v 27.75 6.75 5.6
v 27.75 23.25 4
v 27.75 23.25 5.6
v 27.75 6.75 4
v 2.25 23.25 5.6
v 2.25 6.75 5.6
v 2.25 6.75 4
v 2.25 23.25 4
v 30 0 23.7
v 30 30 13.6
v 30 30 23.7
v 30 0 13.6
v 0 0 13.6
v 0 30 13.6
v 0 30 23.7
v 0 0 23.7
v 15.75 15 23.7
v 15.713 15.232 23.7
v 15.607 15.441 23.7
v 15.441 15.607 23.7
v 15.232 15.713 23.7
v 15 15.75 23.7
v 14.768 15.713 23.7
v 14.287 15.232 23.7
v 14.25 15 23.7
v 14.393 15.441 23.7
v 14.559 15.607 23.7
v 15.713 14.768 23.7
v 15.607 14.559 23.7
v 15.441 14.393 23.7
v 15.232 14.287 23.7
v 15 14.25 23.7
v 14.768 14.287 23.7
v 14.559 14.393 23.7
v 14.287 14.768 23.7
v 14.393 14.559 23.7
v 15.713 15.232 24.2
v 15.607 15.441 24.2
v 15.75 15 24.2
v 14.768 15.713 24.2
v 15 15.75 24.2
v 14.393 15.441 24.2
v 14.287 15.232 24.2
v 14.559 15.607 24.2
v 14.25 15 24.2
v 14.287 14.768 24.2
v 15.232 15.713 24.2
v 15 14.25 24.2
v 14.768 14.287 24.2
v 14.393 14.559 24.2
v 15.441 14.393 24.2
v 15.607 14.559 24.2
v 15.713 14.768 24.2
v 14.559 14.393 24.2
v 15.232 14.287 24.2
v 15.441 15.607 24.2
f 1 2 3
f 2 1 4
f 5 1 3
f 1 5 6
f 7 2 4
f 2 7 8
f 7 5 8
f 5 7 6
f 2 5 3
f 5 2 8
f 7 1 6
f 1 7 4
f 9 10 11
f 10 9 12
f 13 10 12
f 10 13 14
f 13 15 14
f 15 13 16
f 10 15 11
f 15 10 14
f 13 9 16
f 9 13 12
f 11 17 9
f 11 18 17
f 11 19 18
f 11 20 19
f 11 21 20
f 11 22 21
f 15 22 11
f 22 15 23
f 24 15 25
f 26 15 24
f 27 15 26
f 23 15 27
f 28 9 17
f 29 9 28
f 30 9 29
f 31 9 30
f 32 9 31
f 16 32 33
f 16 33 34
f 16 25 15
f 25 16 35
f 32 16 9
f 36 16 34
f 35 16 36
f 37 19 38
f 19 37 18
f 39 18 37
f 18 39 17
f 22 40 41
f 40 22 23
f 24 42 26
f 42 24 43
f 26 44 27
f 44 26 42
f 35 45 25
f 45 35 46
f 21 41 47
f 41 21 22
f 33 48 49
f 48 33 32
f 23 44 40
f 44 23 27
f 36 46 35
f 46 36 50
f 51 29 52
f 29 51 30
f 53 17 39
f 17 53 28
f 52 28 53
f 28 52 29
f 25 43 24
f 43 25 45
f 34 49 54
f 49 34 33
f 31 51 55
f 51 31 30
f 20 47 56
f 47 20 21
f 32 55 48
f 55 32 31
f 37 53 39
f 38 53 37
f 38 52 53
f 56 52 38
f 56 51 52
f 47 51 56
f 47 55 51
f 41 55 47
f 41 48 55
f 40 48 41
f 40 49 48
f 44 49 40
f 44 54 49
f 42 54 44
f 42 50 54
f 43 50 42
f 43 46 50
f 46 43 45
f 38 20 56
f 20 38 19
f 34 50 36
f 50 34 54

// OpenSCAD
// stack_assembly.scad
// Top-level visual assembly. Imports each part and renders the
// stack for sanity-checking dimensions and clearances.
//
// NOT for export. Use individual part files for STL/DXF generation.
//
// Render: F5 with $fn=20 for fast preview; F6 with $fn=60 for accurate.

$fn = 30;

// =================================================================
// TIER (must match across all imported scads)
// =================================================================
TIER_PARAM = "single-cell";    // Change for full assembly preview

// =================================================================
// LAYER THICKNESSES (from 05_FULL_ARRAY_BUILD.md §6)
// =================================================================
DRIVER_FLOOR_GAP      = 4.0;     // standoffs from enclosure floor to driver PCB
DRIVER_PCB_THK        = 1.6;
DRIVER_TO_COIL_GAP    = 8.0;     // standoffs from driver PCB to coil PCB
PCB_THICKNESS         = 1.6;     // coil PCB
FERRITE_THICKNESS     = 0.5;
LOWER_POLE_THICKNESS  = 0.5;
HOUSING_THICKNESS     = 4.0;
UPPER_POLE_THICKNESS  = 0.5;
TOP_PLATE_THICKNESS   = 3.0;
PIN_PROTRUSION        = 0.5;

// Plate sizing per tier
function plate_xy(t) =
    t == "single-cell" ? [30, 30]
    : t == "forty-cell" ? [280, 35]
    : t == "full-array" ? [180, 190]
    : [0, 0];

PXY = plate_xy(TIER_PARAM);

// =================================================================
// LAYER COLORS
// =================================================================
COL_PCB     = [0.10, 0.10, 0.10, 1.0];   // black solder mask
COL_COIL    = [0.85, 0.55, 0.20, 1.0];   // copper, accent
COL_FERRITE = [0.40, 0.40, 0.45, 0.7];   // gray, semi-transparent
COL_POLE    = [0.50, 0.50, 0.55, 1.0];   // steel
COL_HOUSING = [0.20, 0.20, 0.25, 1.0];   // CF-PETG (dark gray)
COL_AL      = [0.85, 0.85, 0.90, 1.0];   // anodized aluminum
COL_PIN     = [0.80, 0.80, 0.85, 1.0];

// =================================================================
// STACK
// =================================================================

z_driver     = DRIVER_FLOOR_GAP;
z_pcb        = z_driver + DRIVER_PCB_THK + DRIVER_TO_COIL_GAP;
z_ferrite    = z_pcb + PCB_THICKNESS;
z_lower_pole = z_ferrite + FERRITE_THICKNESS;
z_housing    = z_lower_pole + LOWER_POLE_THICKNESS;
z_upper_pole = z_housing + HOUSING_THICKNESS;
z_top        = z_upper_pole + UPPER_POLE_THICKNESS;
z_pin_top    = z_top + TOP_PLATE_THICKNESS + PIN_PROTRUSION;

// Driver PCB visualization (smaller footprint than coil PCB)
color([0.10, 0.10, 0.10, 1.0])
    translate([(PXY[0] - PXY[0]*0.85) / 2, (PXY[1] - PXY[1]*0.55) / 2, z_driver])
        cube([PXY[0] * 0.85, PXY[1] * 0.55, DRIVER_PCB_THK]);

color(COL_PCB)
    translate([0, 0, z_pcb])
        cube([PXY[0], PXY[1], PCB_THICKNESS]);

color(COL_FERRITE)
    translate([0, 0, z_ferrite])
        cube([PXY[0], PXY[1], FERRITE_THICKNESS]);

color(COL_POLE)
    translate([0, 0, z_lower_pole])
        cube([PXY[0], PXY[1], LOWER_POLE_THICKNESS]);

color(COL_HOUSING)
    translate([0, 0, z_housing])
        cube([PXY[0], PXY[1], HOUSING_THICKNESS]);

color(COL_POLE)
    translate([0, 0, z_upper_pole])
        cube([PXY[0], PXY[1], UPPER_POLE_THICKNESS]);

color(COL_AL)
    translate([0, 0, z_top])
        cube([PXY[0], PXY[1], TOP_PLATE_THICKNESS]);

// Sample pin (visible above top plate at center)
color(COL_PIN)
    translate([PXY[0]/2, PXY[1]/2, z_top + TOP_PLATE_THICKNESS])
        cylinder(d=1.5, h=PIN_PROTRUSION, $fn=20);

// =================================================================
// LABELS
// =================================================================

translate([PXY[0] + 5, PXY[1]/2, 0])
    rotate([0, 0, 0])
        text(str("TIER: ", TIER_PARAM), size=4);
